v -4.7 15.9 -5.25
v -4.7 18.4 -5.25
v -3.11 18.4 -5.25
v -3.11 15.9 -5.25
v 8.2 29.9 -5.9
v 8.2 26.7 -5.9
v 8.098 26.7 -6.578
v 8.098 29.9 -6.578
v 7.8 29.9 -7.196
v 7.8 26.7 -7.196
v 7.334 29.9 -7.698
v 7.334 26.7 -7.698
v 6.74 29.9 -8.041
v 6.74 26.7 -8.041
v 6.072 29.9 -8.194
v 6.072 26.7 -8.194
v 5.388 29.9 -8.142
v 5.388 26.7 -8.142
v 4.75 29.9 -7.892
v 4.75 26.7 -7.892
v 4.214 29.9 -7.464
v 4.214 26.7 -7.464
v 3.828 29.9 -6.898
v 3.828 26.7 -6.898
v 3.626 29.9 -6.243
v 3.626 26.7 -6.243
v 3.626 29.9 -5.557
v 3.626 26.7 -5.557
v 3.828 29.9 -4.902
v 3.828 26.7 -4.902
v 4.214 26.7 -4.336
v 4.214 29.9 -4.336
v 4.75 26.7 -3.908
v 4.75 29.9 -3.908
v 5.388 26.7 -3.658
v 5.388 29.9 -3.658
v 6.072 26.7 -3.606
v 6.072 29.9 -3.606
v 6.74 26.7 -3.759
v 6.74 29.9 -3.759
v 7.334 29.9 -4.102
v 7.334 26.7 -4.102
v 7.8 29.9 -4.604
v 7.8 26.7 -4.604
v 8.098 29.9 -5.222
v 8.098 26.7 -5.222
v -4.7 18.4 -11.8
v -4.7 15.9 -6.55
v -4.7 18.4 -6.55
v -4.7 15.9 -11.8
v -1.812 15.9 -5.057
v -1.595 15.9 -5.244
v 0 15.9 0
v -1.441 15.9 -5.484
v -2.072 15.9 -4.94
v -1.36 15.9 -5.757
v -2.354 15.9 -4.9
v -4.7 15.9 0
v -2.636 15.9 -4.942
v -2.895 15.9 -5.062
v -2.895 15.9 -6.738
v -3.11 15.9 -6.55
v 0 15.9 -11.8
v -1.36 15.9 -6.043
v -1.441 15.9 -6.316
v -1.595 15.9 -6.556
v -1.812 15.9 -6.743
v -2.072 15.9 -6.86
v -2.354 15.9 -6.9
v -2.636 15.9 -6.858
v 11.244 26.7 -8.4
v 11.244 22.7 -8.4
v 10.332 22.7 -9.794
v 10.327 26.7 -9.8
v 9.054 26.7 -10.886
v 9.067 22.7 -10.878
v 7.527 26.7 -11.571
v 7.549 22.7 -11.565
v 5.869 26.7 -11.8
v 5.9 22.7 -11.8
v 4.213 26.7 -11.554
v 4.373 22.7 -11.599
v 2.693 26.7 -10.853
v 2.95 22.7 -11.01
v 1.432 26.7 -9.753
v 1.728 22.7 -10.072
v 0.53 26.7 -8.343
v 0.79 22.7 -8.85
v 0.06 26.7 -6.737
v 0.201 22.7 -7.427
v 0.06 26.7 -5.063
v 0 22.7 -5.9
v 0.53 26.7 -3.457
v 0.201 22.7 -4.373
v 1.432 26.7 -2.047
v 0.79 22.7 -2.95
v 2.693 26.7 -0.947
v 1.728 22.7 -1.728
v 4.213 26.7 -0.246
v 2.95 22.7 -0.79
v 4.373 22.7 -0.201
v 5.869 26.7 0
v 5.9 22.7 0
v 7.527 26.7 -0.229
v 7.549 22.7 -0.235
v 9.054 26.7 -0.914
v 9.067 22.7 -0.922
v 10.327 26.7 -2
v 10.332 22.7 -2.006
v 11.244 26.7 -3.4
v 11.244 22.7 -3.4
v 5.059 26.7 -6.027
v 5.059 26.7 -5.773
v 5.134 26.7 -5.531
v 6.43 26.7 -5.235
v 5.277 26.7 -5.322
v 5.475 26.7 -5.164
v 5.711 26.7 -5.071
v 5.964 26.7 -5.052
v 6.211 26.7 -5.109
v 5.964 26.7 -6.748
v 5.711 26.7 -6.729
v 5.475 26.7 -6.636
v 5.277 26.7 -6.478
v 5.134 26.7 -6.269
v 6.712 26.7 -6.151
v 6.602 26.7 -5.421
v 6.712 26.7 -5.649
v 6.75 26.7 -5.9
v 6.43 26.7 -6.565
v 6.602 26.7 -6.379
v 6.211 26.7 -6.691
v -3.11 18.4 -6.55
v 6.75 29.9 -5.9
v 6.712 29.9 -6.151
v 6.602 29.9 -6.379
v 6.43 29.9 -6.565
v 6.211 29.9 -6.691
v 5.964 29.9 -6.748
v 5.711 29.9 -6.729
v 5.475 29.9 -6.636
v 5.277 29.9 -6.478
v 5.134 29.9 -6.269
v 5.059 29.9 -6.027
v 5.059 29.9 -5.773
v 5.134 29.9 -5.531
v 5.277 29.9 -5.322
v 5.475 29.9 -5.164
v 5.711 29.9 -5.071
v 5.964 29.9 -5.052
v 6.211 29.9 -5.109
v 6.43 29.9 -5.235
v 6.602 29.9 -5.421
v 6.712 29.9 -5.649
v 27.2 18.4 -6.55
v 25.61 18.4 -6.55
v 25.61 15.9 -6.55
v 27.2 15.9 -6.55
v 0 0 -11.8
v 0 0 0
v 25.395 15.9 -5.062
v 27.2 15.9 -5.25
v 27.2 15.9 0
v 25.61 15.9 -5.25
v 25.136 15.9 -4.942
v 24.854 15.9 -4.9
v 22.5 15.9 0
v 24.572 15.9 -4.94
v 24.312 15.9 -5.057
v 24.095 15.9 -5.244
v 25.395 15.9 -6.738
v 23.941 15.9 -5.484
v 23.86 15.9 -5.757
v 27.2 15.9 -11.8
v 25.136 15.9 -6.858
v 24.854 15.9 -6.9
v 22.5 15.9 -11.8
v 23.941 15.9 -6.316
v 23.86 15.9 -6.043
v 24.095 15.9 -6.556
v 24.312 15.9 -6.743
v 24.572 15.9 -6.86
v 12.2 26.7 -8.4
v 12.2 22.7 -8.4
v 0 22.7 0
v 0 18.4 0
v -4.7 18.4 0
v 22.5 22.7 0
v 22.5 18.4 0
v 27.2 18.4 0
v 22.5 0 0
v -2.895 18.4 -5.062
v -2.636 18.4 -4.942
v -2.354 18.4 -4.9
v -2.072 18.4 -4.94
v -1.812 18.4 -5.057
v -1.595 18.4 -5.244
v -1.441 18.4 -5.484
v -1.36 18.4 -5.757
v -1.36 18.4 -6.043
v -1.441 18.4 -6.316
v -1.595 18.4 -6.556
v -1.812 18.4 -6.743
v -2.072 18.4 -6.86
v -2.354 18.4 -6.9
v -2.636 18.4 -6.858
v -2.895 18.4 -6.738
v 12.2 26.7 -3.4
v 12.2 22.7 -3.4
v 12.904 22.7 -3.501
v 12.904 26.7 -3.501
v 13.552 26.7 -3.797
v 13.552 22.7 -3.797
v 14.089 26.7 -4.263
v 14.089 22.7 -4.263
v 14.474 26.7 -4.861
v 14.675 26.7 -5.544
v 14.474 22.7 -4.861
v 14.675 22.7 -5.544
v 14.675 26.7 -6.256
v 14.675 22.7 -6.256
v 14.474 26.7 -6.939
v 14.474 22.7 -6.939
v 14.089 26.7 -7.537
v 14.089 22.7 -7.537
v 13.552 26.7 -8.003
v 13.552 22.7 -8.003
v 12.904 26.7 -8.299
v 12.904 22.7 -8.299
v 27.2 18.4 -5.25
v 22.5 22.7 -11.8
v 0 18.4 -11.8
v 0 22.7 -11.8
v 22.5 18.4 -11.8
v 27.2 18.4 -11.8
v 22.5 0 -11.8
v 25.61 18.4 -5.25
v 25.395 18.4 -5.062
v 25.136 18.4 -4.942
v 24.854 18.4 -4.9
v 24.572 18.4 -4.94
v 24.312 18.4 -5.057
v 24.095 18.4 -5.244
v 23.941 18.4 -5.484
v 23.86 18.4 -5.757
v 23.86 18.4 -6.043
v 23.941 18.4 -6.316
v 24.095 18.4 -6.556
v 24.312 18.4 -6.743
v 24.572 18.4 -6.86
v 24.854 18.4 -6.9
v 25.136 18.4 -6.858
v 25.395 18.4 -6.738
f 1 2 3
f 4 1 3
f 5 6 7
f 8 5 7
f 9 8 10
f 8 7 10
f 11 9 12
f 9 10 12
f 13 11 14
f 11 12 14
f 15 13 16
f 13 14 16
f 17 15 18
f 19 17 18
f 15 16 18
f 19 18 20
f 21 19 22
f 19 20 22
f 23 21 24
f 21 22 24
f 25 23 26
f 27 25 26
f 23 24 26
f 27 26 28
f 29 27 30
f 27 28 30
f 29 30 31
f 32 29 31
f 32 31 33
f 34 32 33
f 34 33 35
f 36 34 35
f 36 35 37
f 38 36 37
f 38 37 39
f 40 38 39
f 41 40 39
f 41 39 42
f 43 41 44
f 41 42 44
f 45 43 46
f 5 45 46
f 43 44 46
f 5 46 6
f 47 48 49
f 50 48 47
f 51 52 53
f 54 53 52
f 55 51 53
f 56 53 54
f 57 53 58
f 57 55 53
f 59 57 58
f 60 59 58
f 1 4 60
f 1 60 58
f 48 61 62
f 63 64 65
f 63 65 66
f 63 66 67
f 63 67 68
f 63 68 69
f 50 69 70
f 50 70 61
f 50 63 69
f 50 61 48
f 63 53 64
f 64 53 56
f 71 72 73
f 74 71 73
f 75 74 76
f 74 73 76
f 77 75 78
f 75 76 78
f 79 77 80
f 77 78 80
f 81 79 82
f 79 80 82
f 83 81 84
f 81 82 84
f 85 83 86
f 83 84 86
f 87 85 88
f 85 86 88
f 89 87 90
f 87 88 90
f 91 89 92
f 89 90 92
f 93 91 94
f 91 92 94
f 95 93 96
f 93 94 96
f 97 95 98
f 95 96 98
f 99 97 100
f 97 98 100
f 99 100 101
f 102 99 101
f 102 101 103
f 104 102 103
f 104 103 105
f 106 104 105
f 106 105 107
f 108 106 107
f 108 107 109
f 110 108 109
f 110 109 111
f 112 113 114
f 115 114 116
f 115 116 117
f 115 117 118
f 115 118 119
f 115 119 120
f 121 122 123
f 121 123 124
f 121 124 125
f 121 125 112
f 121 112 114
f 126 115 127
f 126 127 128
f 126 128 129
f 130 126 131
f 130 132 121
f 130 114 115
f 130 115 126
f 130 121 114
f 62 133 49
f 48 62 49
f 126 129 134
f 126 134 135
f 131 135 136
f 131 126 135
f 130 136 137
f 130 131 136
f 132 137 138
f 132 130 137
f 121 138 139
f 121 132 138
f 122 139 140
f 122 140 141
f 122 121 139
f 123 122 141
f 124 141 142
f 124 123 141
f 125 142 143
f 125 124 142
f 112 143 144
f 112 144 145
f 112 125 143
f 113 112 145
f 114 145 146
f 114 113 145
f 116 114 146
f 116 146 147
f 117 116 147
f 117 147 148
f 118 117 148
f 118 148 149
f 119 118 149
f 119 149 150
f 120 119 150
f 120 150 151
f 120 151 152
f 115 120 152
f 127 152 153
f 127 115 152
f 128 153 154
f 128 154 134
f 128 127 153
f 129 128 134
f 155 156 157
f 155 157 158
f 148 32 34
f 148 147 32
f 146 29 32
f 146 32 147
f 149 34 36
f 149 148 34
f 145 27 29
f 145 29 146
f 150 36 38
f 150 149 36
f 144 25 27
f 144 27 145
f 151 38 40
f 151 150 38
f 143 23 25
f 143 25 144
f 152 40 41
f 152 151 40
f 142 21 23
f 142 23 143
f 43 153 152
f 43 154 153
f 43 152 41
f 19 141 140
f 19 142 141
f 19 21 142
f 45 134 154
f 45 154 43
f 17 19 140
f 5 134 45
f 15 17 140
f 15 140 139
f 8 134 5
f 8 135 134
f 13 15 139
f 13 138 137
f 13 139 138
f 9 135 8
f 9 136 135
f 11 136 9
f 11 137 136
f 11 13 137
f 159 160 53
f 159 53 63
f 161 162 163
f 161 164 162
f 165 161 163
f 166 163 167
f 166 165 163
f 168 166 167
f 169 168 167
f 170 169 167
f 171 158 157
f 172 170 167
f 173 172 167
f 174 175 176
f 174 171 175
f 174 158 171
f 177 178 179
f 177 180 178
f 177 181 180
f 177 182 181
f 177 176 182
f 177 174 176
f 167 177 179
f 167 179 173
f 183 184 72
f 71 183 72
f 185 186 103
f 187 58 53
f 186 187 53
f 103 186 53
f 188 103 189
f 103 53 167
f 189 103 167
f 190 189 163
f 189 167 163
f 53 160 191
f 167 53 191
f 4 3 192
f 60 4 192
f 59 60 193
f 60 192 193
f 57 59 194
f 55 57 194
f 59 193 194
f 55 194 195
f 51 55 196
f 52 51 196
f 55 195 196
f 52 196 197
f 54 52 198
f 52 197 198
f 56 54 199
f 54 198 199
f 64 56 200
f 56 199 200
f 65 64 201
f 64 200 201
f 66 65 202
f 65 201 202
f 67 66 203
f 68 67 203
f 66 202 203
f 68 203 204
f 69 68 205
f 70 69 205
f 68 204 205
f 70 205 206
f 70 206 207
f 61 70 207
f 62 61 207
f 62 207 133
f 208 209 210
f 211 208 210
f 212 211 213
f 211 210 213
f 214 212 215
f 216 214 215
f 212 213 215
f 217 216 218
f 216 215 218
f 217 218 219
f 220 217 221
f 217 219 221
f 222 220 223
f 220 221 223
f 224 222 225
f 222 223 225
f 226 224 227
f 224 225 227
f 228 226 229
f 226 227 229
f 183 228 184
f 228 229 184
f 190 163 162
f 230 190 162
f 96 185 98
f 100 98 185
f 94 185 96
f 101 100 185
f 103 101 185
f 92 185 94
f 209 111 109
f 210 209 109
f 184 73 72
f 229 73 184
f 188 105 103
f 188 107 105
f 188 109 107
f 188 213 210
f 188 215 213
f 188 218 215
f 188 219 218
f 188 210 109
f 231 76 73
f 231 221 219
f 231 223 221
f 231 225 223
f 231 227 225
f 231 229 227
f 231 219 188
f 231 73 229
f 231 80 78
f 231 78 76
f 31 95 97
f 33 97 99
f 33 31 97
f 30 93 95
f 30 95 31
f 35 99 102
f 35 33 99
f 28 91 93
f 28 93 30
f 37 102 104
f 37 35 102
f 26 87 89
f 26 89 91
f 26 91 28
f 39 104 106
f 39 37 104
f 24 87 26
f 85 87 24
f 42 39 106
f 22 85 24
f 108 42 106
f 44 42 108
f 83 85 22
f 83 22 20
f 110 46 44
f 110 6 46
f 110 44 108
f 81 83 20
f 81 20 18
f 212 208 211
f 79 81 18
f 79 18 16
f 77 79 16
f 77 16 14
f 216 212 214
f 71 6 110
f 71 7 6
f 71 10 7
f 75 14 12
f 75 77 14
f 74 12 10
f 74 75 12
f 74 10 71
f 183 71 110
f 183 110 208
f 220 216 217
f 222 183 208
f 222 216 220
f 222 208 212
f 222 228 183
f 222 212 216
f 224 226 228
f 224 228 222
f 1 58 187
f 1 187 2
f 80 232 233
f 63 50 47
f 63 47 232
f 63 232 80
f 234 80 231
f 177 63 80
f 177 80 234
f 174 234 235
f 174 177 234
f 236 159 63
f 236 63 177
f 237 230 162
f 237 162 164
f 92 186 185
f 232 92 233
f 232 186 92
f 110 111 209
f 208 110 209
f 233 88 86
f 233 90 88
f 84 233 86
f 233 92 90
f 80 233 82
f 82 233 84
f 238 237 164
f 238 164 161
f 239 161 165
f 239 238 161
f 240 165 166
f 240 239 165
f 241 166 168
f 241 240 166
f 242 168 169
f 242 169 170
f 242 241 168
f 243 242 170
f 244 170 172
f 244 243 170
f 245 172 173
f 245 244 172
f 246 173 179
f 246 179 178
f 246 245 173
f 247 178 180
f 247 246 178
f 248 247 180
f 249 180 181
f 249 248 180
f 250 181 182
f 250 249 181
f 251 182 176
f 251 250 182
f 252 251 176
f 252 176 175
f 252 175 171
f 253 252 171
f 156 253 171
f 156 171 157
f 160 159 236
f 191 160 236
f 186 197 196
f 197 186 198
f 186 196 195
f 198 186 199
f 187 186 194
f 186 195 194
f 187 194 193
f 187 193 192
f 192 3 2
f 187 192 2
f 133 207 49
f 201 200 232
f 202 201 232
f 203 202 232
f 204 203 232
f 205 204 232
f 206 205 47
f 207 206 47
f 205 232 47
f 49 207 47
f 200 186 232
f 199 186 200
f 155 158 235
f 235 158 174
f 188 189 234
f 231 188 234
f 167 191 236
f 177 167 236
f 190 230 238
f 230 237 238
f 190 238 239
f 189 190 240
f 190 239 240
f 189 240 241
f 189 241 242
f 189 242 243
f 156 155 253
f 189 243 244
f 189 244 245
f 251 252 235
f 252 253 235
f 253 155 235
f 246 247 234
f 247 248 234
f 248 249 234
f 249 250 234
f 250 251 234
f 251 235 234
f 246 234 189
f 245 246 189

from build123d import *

# Parameters (mm, degrees)
SKETCH1_W           = 22.5
SKETCH1_H           = 11.8
BOSS_EXTRUDE1_DEPTH = 22.7
SKETCH2_W           = 4.7
SKETCH2_H           = 11.8
BOSS_EXTRUDE2_DEPTH = 2.5
BOSS_EXTRUDE3_DEPTH = 4
CUT_EXTRUDE1_DEPTH  = 2.5
SKETCH5_R           = 2.3
SKETCH5_R_2         = 0.85
BOSS_EXTRUDE4_DEPTH = 3.2


with BuildPart() as part:
    # Sketch1 → Boss-Extrude1 (new body)
    with BuildSketch(Plane(origin=(0, 0, 0), x_dir=(1, 0, 0), z_dir=(0, 1, 0))):
        with Locations((11.25, 5.9)):
            Rectangle(SKETCH1_W, SKETCH1_H)
    extrude(amount=BOSS_EXTRUDE1_DEPTH)

    # Sketch2 → Boss-Extrude2 (add)
    with BuildSketch(Plane(origin=(0, 15.89999995, 0), x_dir=(-1, 0, 0), z_dir=(0, -1, 0))):
        with Locations((-24.85, 5.9)):
            Rectangle(SKETCH2_W, SKETCH2_H)
        with Locations((2.35, 5.9)):
            Rectangle(SKETCH2_W, SKETCH2_H)
    extrude(amount=-BOSS_EXTRUDE2_DEPTH)

    # Sketch3 → Boss-Extrude3 (add)
    with BuildSketch(Plane(origin=(0, 22.7, 0), x_dir=(1, 0, 0), z_dir=(0, 1, 0))):
        with BuildLine():
            Line((12.2, 8.4), (11.244155686, 8.4))
            ThreePointArc((11.244155686, 8.4), (0, 5.9), (11.244155686, 3.4))
            Line((11.244155686, 3.4), (12.2, 3.4))
            ThreePointArc((12.2, 3.4), (14.7, 5.9), (12.2, 8.4))
        make_face()
    extrude(amount=BOSS_EXTRUDE3_DEPTH)

    # Sketch4 → Cut-Extrude1 (cut)
    with BuildSketch(Plane(origin=(0, 18.39999995, 0), x_dir=(1, 0, 0), z_dir=(0, 1, 0))):
        with BuildLine():
            Line((-4.7, 6.55), (-4.7, 5.25))
            Line((-4.7, 5.25), (-3.109934208, 5.25))
            ThreePointArc((-3.109934208, 5.25), (-1.35, 5.9), (-3.109934208, 6.55))
            Line((-3.109934208, 6.55), (-4.7, 6.55))
        make_face()
        with BuildLine():
            Line((27.2, 6.55), (27.2, 5.25))
            Line((27.2, 5.25), (25.609934208, 5.25))
            ThreePointArc((25.609934208, 5.25), (23.85, 5.9), (25.609934208, 6.55))
            Line((25.609934208, 6.55), (27.2, 6.55))
        make_face()
    extrude(amount=-CUT_EXTRUDE1_DEPTH, mode=Mode.SUBTRACT)

    # Sketch5 → Boss-Extrude4 (add)
    with BuildSketch(Plane(origin=(0, 26.7, 0), x_dir=(1, 0, 0), z_dir=(0, 1, 0))):
        with Locations((5.9, 5.9)):
            Circle(SKETCH5_R)
        with Locations((5.9, 5.9)):
            Circle(SKETCH5_R_2, mode=Mode.SUBTRACT)
    extrude(amount=BOSS_EXTRUDE4_DEPTH)


solid = part.part
